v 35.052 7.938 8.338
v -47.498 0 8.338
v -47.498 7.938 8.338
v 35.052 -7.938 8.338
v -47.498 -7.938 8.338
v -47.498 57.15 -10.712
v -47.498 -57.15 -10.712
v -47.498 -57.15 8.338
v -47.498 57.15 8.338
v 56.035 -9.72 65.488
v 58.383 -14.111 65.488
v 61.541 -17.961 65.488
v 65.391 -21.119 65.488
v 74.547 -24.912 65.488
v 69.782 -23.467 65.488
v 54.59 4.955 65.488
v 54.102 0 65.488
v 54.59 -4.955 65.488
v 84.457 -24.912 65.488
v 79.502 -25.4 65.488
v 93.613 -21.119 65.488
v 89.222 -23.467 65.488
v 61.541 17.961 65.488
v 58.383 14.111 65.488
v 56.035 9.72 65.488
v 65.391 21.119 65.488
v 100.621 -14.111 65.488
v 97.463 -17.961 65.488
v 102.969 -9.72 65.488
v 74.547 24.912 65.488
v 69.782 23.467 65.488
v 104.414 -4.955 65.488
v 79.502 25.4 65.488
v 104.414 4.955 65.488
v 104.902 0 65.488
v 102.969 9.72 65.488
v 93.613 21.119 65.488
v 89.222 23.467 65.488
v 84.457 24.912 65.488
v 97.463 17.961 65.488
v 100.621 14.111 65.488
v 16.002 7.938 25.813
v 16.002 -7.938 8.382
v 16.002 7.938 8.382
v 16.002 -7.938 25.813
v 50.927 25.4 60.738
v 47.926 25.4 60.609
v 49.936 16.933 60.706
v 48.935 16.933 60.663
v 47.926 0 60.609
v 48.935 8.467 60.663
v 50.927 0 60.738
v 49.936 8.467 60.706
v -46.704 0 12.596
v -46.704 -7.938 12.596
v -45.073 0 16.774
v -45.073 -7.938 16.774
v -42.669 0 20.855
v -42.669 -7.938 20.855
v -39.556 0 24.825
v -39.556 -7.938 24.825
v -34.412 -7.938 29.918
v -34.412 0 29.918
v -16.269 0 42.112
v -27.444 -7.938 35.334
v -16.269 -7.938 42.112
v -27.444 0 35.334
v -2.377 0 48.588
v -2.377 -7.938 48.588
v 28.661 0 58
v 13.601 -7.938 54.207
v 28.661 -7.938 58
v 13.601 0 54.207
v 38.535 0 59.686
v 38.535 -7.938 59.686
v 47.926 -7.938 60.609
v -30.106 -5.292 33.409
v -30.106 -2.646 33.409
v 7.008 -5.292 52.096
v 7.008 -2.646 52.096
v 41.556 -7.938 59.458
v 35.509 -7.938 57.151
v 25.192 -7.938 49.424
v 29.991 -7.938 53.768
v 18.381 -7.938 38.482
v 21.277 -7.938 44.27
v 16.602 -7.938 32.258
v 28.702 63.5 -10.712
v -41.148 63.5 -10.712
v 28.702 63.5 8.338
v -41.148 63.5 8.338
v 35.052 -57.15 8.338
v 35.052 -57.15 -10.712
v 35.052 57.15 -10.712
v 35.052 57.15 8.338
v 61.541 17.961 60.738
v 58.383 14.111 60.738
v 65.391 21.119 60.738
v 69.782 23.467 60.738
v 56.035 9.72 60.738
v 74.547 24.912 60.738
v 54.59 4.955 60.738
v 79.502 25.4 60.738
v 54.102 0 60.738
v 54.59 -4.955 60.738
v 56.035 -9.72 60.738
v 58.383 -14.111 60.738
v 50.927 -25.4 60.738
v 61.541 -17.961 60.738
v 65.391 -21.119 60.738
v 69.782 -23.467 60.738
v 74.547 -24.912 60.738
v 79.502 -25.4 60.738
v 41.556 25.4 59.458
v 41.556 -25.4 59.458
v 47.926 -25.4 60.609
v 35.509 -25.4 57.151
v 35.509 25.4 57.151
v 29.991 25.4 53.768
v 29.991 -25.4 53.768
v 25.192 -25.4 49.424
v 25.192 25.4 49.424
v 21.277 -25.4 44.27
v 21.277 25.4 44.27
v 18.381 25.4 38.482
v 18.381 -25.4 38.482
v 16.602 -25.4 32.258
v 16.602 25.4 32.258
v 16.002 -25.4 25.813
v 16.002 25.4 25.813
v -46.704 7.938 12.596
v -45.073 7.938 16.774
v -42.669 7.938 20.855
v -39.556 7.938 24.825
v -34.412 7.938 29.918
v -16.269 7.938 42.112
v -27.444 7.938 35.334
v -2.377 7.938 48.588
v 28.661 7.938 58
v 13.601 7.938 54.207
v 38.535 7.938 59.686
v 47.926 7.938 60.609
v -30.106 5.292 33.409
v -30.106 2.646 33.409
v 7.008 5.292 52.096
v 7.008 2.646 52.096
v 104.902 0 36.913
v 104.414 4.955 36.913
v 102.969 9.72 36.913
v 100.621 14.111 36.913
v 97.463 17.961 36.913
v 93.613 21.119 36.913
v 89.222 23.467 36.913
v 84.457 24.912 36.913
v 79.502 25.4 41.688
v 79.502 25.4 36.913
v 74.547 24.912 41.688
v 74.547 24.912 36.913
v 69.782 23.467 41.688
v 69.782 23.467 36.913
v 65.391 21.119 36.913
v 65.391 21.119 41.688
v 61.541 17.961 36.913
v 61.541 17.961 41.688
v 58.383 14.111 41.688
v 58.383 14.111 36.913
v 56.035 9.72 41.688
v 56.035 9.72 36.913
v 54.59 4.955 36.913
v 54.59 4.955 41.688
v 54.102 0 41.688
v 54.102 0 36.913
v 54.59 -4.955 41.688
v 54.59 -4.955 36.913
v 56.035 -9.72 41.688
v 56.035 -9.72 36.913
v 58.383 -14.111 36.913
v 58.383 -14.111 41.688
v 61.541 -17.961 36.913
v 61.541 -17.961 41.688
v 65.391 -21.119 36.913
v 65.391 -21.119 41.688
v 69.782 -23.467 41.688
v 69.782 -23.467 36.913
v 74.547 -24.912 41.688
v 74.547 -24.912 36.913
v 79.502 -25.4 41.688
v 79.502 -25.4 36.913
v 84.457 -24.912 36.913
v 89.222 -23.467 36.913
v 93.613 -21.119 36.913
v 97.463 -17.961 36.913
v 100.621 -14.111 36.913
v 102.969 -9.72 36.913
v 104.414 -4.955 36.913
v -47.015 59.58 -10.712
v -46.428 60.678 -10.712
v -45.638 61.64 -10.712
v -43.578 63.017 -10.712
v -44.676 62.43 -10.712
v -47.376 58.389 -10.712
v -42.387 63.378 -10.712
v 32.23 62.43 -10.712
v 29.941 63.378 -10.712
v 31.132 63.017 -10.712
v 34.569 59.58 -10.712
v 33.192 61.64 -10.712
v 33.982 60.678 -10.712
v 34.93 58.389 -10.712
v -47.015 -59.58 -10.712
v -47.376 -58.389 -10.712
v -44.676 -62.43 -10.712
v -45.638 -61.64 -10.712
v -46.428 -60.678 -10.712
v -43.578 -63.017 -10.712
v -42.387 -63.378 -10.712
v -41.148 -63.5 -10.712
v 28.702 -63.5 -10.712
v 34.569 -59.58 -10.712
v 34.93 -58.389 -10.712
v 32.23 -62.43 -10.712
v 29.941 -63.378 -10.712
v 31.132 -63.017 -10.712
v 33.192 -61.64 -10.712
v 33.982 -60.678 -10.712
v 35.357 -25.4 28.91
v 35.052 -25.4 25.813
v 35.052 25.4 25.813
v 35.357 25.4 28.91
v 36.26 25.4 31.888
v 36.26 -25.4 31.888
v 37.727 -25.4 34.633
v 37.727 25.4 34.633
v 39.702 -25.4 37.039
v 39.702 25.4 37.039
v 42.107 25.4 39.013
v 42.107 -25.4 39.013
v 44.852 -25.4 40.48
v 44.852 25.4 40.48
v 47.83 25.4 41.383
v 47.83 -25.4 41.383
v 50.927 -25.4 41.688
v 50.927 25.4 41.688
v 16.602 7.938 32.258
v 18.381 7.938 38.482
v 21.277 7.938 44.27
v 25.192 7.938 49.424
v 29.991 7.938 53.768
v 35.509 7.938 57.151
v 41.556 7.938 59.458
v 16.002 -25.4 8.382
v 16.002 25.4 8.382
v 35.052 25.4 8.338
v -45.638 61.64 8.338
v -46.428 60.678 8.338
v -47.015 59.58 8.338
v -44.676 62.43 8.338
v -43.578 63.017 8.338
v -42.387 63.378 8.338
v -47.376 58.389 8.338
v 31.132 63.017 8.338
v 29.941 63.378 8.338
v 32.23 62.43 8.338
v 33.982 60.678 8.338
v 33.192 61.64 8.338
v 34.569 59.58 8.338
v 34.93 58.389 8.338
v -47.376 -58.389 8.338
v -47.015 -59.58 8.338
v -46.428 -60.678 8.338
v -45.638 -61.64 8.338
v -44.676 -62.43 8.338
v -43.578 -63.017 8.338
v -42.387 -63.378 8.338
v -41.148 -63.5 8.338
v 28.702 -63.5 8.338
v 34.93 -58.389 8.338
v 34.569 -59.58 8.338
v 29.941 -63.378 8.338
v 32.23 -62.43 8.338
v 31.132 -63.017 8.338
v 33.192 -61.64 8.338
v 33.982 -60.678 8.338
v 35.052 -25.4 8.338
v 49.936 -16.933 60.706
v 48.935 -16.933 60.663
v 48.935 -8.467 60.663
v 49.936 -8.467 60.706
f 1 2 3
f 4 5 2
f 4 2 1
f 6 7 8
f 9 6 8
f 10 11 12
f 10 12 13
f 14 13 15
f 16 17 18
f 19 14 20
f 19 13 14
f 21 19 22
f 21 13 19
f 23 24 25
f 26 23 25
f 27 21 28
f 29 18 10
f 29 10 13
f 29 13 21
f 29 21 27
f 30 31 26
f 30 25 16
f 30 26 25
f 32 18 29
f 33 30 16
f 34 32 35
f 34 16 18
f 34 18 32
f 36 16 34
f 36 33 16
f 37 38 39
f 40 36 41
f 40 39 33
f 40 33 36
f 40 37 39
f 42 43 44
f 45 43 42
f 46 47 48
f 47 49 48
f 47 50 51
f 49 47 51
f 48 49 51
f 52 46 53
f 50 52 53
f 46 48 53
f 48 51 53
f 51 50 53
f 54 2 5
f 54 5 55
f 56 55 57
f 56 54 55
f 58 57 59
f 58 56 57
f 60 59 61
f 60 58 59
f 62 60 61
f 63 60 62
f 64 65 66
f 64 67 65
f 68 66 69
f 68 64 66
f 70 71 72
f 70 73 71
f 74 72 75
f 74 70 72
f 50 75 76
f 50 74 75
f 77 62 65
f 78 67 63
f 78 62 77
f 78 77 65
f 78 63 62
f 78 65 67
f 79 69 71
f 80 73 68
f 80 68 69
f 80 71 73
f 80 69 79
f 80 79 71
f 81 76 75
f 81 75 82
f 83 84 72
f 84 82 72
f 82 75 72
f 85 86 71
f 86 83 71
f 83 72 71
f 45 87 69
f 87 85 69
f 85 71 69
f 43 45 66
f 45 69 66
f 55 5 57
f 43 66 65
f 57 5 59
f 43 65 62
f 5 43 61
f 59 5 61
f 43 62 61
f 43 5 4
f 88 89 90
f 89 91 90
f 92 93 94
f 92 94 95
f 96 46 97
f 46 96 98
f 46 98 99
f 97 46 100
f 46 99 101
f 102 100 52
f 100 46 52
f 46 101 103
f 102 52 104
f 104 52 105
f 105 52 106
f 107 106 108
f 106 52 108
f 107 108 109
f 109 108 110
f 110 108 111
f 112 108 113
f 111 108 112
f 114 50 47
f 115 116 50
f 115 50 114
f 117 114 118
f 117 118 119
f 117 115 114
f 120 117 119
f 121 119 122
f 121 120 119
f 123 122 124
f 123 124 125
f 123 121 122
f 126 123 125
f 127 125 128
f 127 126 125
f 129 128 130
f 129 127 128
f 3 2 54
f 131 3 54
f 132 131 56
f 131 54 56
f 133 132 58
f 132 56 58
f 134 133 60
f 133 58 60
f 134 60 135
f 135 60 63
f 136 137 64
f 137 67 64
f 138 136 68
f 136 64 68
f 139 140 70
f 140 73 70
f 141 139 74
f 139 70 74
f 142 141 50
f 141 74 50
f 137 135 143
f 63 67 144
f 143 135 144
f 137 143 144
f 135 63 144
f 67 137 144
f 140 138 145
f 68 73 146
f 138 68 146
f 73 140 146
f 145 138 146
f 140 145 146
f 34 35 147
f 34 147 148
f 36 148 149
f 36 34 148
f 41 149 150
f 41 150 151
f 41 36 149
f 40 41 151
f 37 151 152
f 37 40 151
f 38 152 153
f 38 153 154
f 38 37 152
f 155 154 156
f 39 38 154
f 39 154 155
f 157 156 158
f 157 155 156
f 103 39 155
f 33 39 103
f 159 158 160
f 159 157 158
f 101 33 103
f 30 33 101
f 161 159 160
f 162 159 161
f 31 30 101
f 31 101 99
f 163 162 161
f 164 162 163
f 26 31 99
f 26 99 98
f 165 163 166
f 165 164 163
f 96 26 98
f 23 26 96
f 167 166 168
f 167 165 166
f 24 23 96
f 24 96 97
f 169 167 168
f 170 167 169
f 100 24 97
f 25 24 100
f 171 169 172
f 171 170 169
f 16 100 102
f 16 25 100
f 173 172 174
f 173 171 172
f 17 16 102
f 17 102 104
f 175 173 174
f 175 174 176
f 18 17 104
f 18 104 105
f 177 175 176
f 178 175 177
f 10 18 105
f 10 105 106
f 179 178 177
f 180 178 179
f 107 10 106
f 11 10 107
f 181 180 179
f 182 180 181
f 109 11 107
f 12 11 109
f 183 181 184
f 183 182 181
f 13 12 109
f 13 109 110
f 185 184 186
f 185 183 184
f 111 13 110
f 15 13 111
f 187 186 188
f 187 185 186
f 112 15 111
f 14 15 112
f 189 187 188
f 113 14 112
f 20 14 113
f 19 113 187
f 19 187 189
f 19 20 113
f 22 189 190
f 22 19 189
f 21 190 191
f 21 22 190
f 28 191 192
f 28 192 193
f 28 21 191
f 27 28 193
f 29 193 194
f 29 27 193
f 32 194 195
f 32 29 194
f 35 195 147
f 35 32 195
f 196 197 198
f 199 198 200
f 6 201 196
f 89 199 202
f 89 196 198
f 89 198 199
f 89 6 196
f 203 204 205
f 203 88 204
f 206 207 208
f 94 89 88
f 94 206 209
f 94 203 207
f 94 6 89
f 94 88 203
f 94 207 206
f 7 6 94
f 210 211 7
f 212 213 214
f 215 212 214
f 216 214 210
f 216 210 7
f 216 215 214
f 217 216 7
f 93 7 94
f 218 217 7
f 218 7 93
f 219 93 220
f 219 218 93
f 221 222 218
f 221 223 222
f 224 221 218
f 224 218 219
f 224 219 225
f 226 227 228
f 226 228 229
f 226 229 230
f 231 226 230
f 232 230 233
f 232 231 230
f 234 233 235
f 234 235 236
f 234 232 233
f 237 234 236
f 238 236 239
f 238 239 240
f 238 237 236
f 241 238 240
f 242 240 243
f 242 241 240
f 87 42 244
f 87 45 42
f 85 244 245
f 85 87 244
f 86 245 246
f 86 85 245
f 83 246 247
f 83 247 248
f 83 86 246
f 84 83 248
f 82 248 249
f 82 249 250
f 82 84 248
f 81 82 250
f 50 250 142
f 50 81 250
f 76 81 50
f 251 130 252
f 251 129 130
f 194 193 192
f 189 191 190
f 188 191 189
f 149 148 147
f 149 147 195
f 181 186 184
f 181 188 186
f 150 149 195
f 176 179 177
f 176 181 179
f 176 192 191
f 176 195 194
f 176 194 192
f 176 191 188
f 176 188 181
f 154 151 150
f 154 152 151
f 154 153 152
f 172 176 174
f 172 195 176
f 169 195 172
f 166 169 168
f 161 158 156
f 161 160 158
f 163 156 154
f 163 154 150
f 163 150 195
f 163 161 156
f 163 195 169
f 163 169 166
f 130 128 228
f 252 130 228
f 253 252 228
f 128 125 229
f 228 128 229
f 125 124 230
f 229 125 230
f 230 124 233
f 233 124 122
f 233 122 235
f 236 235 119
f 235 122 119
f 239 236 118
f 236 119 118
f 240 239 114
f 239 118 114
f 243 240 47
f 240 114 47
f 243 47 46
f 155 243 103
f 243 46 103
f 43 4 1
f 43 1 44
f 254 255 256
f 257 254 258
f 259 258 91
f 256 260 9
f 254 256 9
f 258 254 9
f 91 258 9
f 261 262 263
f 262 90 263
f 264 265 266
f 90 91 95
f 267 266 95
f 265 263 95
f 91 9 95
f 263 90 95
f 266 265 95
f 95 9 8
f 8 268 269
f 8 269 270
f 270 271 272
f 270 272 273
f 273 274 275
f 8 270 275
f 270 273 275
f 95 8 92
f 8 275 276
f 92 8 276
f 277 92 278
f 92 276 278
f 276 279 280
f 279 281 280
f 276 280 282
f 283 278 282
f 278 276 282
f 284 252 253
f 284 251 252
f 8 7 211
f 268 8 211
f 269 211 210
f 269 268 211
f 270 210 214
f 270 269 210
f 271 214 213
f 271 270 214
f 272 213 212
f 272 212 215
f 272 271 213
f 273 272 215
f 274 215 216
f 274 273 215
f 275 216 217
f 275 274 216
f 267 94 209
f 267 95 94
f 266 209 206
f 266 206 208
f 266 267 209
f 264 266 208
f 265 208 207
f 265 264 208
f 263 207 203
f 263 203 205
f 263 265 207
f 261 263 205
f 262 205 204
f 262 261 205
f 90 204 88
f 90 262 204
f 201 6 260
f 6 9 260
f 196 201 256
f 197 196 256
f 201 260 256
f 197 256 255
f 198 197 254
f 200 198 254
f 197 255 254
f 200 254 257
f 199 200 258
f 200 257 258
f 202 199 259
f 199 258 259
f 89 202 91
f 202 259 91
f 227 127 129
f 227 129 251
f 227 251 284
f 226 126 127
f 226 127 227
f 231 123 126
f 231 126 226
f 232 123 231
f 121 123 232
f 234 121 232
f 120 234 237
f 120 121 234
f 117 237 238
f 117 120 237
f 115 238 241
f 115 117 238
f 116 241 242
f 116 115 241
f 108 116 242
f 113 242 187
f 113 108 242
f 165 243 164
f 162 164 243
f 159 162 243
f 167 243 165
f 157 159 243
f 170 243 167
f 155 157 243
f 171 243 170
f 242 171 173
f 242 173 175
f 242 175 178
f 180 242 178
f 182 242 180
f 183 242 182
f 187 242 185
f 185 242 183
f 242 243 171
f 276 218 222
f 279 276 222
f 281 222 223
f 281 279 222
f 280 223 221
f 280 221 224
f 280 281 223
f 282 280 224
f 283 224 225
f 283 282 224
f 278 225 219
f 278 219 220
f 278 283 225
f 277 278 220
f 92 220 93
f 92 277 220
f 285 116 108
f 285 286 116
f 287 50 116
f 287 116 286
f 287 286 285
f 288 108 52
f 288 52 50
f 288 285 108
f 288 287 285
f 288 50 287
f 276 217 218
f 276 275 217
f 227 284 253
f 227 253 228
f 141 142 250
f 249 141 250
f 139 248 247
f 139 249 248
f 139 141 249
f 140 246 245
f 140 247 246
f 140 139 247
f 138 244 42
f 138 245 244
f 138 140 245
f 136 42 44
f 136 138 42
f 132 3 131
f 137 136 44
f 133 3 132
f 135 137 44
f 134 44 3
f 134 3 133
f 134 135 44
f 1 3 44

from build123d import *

# Parameters (mm, degrees)
F0_W     = 82.55
F0_H     = 19.05
F1_DEPTH = 63.5
F2_DEPTH = 25.4
F3_DEPTH = 7.9375
F0_W_2   = 25.4
F4_DEPTH = 25.4
F6_R     = 6.35


with BuildPart() as f1:
    # F0 (on Front) → F1 (new body, symmetric)
    with BuildSketch(Plane.XZ):
        with Locations((-6.222997, -1.186803)):
            Rectangle(F0_W, F0_H)
    extrude(amount=F1_DEPTH, both=True)

    # F6
    f6_edges = [f1.edges().sort_by_distance(p)[0] for p in [
        (-47.497997, -63.5, -1.186803),
        (35.052003, -63.5, -1.186803),
        (35.052003, 63.5, -1.186803),
        (-47.497997, 63.5, -1.186803),
    ]]
    fillet(f6_edges, radius=F6_R)


with BuildPart() as f2:
    # F0 (on Front) → F2 (new body, symmetric)
    with BuildSketch(Plane.XZ):
        with BuildLine():
            Line((16.002003, 8.381999), (35.052003, 8.338197))
            Line((35.052003, 8.338197), (35.052003, 25.813397))
            ThreePointArc((35.052003, 25.813397), (39.701683, 37.038717), (50.927003, 41.688397))
            Line((50.927003, 41.688397), (54.102003, 41.688397))
            Line((54.102003, 41.688397), (54.102003, 60.738397))
            Line((54.102003, 60.738397), (50.927003, 60.738397))
            add(Edge.make_bspline(
                [(47.925812, 60.609208), (48.939961, 60.66769), (49.940829, 60.710865), (50.927003, 60.738397)],
                knots=[108.569455, 108.569455, 108.569455, 108.569455, 111.504536, 111.504536, 111.504536, 111.504536], degree=3))
            ThreePointArc((47.925812, 60.609208), (25.192083, 49.424189), (16.002003, 25.813397))
            Line((16.002003, 25.813397), (16.002003, 8.381999))
        make_face()
    extrude(amount=F2_DEPTH, both=True)

    # F0 (on Front) → F4 (join, symmetric)
    with BuildSketch(Plane.XZ):
        with Locations((66.802003, 51.213397)):
            Rectangle(F0_W_2, F0_H)
    extrude(amount=F4_DEPTH, both=True)

    # F0 (on Front) → F5 (revolve)
    with BuildSketch(Plane.XZ):
        Polygon((79.502003, 65.488197), (79.502003, 60.738397), (79.502003, 41.688397), (79.502003, 36.913197), (104.902003, 36.913197), (104.902003, 65.488197), align=None)
    revolve(axis=Axis((79.502003, 0, 39.300797), (0, 0, 1)))


with BuildPart() as f3:
    # F0 (on Front) → F3 (new body, symmetric)
    with BuildSketch(Plane.XZ):
        with BuildLine():
            add(Edge.make_bspline(
                [(-47.497997, 8.338197), (-45.27217, 35.338723), (10.412176, 58.445943), (47.925812, 60.609208)],
                knots=[0, 0, 0, 0, 108.569455, 108.569455, 108.569455, 108.569455], degree=3))
            Line((-47.497997, 8.338197), (35.052003, 8.338197))
            Line((35.052003, 8.338197), (16.002003, 8.381999))
            Line((16.002003, 8.381999), (16.002003, 25.813397))
            ThreePointArc((16.002003, 25.813397), (25.192083, 49.424189), (47.925812, 60.609208))
        make_face()
    extrude(amount=F3_DEPTH, both=True)


solid = Compound([f1.part, f2.part, f3.part])
